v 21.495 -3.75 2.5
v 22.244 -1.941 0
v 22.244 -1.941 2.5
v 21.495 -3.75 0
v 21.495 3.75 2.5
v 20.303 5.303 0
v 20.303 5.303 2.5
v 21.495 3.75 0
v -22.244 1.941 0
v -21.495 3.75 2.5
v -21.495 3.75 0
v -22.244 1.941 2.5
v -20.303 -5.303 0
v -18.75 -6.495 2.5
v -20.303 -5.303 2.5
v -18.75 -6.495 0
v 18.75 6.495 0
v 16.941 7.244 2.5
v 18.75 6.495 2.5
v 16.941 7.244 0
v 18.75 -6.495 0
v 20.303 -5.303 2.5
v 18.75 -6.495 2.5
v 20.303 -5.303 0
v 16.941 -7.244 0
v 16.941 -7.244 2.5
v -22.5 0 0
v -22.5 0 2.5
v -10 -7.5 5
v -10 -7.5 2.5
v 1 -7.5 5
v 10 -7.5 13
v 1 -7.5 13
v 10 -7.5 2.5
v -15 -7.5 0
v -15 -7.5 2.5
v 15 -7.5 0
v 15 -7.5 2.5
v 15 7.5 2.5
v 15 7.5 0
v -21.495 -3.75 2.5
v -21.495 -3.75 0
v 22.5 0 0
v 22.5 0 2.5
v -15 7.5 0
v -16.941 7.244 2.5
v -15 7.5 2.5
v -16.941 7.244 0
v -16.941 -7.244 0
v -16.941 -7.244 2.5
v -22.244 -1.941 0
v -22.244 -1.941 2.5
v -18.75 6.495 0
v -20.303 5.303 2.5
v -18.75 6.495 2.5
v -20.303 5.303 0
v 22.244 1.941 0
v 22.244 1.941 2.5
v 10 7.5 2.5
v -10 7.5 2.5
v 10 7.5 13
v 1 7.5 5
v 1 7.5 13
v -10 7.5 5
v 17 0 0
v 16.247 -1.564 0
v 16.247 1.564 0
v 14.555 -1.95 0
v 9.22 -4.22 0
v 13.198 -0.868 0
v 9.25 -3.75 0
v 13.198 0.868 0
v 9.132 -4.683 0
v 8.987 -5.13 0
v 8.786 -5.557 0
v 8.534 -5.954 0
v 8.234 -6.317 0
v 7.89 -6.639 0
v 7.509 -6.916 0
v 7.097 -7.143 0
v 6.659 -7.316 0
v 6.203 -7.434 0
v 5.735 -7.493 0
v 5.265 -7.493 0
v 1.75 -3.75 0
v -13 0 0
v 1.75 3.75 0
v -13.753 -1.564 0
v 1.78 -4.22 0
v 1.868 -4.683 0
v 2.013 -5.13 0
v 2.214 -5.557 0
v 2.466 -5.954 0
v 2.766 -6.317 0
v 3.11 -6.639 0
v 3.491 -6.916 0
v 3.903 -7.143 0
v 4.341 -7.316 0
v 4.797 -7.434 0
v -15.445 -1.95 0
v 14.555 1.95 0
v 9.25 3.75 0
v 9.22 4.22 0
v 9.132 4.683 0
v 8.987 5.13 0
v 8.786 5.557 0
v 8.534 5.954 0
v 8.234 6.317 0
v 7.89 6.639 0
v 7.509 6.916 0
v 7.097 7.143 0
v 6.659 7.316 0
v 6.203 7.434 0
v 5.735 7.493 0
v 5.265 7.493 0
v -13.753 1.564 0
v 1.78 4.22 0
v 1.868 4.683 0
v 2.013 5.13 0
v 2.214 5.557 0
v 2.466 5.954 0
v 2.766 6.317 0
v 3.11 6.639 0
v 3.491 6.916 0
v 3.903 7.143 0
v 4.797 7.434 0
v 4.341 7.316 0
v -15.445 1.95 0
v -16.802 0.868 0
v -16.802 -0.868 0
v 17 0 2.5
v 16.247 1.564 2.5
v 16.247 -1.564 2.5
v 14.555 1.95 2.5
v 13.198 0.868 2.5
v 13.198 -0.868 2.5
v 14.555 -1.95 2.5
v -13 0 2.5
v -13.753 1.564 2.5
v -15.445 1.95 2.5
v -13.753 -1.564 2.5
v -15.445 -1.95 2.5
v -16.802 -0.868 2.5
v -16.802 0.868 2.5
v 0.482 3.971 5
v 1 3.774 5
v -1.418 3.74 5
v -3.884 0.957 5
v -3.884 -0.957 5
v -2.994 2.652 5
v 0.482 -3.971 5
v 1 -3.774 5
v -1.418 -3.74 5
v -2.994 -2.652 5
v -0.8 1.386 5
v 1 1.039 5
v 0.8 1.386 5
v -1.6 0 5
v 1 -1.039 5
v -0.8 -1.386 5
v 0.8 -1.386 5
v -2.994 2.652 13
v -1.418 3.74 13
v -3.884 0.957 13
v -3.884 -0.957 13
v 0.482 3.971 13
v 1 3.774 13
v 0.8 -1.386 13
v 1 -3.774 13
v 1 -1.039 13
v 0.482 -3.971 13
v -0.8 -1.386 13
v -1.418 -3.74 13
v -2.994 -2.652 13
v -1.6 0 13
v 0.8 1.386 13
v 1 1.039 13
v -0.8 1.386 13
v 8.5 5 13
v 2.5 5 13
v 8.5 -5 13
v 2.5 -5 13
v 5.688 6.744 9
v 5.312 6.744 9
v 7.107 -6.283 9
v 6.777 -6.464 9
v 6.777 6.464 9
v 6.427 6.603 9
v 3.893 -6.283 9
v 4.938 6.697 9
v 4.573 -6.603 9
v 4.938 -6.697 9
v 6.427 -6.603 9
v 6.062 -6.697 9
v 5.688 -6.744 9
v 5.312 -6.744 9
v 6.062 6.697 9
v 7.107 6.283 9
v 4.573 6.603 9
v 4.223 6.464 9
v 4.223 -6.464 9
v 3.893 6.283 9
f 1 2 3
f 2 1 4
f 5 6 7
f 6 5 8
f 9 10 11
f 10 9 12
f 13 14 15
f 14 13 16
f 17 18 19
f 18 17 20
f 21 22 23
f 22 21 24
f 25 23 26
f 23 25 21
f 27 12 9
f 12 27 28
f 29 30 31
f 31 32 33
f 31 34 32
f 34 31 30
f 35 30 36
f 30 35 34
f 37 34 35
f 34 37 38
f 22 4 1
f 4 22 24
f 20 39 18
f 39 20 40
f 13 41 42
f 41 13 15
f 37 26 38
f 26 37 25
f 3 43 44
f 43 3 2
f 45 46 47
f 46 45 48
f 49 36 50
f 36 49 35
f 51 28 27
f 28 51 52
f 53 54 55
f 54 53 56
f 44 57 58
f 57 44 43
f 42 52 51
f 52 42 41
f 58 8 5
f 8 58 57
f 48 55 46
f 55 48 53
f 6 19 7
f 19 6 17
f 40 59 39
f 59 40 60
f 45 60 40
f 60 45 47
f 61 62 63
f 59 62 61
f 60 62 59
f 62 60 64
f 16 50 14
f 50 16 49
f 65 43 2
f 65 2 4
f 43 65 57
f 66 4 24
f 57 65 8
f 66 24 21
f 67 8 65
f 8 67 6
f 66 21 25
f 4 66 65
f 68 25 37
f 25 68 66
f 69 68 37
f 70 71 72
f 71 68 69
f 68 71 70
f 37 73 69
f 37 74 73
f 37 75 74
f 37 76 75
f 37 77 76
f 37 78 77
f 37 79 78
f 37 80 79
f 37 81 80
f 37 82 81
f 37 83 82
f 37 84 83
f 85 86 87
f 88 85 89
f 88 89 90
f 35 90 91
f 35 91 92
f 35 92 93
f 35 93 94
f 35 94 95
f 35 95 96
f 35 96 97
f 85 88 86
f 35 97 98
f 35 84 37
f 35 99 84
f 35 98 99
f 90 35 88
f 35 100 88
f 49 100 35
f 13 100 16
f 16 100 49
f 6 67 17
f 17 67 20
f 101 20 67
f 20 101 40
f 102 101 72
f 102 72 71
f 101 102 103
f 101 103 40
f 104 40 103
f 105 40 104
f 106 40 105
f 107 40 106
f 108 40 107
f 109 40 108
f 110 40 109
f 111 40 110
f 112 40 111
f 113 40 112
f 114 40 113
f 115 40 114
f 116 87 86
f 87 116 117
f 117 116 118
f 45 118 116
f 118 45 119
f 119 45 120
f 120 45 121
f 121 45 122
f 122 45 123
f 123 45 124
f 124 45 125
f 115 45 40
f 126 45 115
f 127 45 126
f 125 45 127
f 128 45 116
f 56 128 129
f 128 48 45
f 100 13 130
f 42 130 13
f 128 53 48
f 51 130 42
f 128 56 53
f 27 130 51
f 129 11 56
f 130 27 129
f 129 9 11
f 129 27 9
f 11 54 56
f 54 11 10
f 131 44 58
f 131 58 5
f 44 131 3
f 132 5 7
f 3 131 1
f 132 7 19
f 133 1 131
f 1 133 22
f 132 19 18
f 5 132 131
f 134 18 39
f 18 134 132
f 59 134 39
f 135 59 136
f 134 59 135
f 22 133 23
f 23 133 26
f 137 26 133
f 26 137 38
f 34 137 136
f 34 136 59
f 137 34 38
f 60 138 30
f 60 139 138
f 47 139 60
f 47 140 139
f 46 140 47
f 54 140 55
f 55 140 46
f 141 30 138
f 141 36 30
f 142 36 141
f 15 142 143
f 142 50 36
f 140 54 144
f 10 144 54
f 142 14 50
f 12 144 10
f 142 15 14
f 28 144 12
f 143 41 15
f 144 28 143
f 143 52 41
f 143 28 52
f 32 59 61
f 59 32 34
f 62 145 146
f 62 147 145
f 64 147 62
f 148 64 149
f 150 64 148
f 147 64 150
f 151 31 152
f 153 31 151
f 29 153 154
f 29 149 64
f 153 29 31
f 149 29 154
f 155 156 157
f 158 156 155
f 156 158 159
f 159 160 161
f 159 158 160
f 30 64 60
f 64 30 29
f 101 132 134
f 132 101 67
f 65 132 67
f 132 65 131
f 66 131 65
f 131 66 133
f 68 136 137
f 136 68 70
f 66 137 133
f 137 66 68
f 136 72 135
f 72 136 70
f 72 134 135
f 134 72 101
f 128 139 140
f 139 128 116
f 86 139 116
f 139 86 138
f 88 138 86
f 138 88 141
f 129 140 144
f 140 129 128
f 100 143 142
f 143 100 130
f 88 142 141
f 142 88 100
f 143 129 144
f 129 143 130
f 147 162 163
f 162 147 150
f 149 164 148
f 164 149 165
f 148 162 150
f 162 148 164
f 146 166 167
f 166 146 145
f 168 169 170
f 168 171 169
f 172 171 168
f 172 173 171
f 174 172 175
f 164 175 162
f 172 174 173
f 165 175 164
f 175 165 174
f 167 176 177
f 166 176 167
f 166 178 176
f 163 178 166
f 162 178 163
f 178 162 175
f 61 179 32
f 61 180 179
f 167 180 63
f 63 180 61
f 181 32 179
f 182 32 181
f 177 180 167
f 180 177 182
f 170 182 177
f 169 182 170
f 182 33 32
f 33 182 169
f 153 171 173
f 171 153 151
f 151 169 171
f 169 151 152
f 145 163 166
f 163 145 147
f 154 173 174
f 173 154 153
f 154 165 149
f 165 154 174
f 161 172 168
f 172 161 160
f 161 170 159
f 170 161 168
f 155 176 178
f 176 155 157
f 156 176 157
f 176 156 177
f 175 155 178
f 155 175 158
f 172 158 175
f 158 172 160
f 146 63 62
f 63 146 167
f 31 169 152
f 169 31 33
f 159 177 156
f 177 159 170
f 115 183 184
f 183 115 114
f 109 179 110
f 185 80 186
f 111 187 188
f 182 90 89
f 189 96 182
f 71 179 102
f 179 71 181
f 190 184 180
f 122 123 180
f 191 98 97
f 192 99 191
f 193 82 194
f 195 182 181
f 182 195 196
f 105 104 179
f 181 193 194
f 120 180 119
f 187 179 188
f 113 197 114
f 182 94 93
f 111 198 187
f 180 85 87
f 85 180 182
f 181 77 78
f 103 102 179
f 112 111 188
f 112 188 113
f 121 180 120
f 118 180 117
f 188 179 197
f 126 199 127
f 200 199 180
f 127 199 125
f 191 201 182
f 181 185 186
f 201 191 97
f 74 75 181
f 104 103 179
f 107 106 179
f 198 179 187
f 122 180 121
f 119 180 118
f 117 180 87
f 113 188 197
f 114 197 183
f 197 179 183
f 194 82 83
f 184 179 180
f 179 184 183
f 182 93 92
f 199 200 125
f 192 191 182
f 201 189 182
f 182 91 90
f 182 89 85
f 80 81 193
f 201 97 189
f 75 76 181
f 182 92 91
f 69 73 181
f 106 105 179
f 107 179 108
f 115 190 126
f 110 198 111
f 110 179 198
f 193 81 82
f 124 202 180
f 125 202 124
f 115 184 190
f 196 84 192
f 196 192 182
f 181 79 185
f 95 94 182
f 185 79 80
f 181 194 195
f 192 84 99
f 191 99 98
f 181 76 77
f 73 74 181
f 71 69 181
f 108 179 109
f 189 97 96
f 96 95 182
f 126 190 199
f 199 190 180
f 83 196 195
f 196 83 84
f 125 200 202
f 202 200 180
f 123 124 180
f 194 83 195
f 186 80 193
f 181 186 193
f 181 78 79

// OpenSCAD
// file: fasteners.scad
/* fasteners                        */
/* include <fasteners.scad>          */

M3_grip_d   = 3.2;      // grips screw
M3_free_d   = 4;        // no grip
M3_countersunk_d = 6.5; // maximum diameter of countersunk hold for flathead M3

//countersink();

module countersink( d = M3_countersunk_d )
{
    r = d/2;
    translate ([0,0, -r]) cylinder(r1 = 0, r2 = r, h = r);
}
// file: arduino.scad
/* Arduino dimensions module                                         */
/* include <arduino.scad>                                   */
/* dimensions for arduino mounting holes                    */
/* modules to draw mounting holes                           */
/* and standoffs                                            */
/* Version 1.0: Created Simon Jensen-Fellows    01.31.2018  */

include <standoff.scad>
include <fasteners.scad>

/*  Arduino dimensions    uno | mega        */ 
/*  __________________________|_________    */
/*  |  O B                    |    E O |    */
/*  |         Y               |        |    */
/*  |         ^               |         \   */
/*  |         |           C O |          |   */
/*  |         |               |          |   */
/*  |         o-----> X       |          |   */
/*  |                     D O |          |   */
/*  |  O A                    |      F O |   */
/*  |_________________________|__________|   */
/*                            |              */

arduino_A_B_Y = 48.26;  // distance from A to B on the X axis
arduino_A_B_X = 1.27;   // distance from A to B on the Y axis
arduino_A_C_Y = 5.08 + 27.94;
arduino_A_C_X = 52.07;
arduino_A_D_Y = 5.08;
arduino_A_D_X = arduino_A_C_X;
arduino_A_E_Y = arduino_A_B_Y;
arduino_A_E_X = 76.2;
arduino_A_F_Y = 0;
arduino_A_F_X = 82.55; 

/* Note. On some uno/deicimilia boards,         */
/* the D hole is smaller than M3 - probably M2  */
/* This will be fixed later                     */

/* build standoffs for an original Uno type     */
/* Arduino board.                               */

module arduino_uno_standoffs( h = 10, inside_d = M3_grip_d, outside_d = 8)
{
    standoffs(inside_d = inside_d, outside_d = outside_d, h = h,
                v=[0, 0, arduino_A_B_X, arduino_A_B_Y, arduino_A_C_X, arduino_A_C_Y, arduino_A_D_X, arduino_A_D_Y]);
}    

/* build standoffs for a mega type Arduino board*/

module arduino_mega_standoffs( h = 10, inside_d = M3_grip_d, outside_d = 8)
{
       arduino_uno_standoffs(h=h, inside_d = inside_d, outside_d = outside_d);
       standoffs(inside_d = inside_d, outside_d = outside_d, h = h,
                v=[0, 0, arduino_A_E_X, arduino_A_E_Y, arduino_A_F_X, arduino_A_F_Y]);
}
// file: 37d.scad
/* 37D Motor module                                         */
/* include <37d.scad>                                       */
/* dimensions for 37D type motor                            */
/* modules to draw motor body and                           */
/* holes for mounting bolts and axle                        */
/* Version 1.0: Created Simon Jensen-Fellows    01.31.2018  */

include <simon.scad>
include <fasteners.scad>

37d_gearbox_d = 37;
37d_gearbox_l = 22;
37d_body_d = 34.5;
37d_full_l = 68;
37d_bolt_orbit_d = 31;  // diameter of the circle described by the M3 screw hols
37d_axle_d = 12.2;      // diameter of the axle bearing housing
37d_axle_offset = 7;    // distance from the center of the gearbox cylinder to the center of the axle bearing housing
37d_motor_base_w = 40;  // dimensions for the motor base mount housing
37d_motor_base_h = 20;
37d_bracket_width = 4;  // width of the bracket that mates with the face of the motor
//$fn = 100;
//37d_motor_base();     // uncomment this to build the motor mount alone

/* Describes the motor as two cylinders                     */
/* the fatter cylinder is the gearbox, the other is the main*/
/* motor body.                                              */
/* cylinder is oriented face down, centered on the origin   */
/* with the body upright in positive space.                 */

module 37d_body()
{
    cylinder( d = 37d_gearbox_d, h = 37d_gearbox_l);
    cylinder( d = 37d_body_d, h = 37d_full_l);
}

/* Describes the holes (cutouts) needed to mount the motor  */
/* to a bracket with the M3 screw holes.                    */
/* Use the same translate() arguments used for the body     */
/* and difference() with the bracket to remove the screw    */
/* cylinders.                                               */

module 37d_cutout(d = 3.2, h = 5)
{
    // axle surround
    translate([37d_axle_offset,0,-h]) cylinder( d= 37d_axle_d, h=h);
    // mounting bolt holes
    for(i = [0:60:300])
        rotate([0,0,i]) translate([0,37d_bolt_orbit_d/2,-h]){
            cylinder(d = d, h = h);
            rotate([180,0,0]) countersink();
        }
}    

/* Build a 37D motor mount                                  */
/* d is the diameter of the screw holes for the tension     */
/* strap. Ideally should be larger than the screw/bolt size.*/

module 37d_motor_base(d = 3.2)   
{  
                {
                    difference(){
                        union(){
                            cube([37d_bracket_width, 37d_motor_base_w, 37d_motor_base_w]);
                            cube([37d_full_l + 37d_bracket_width, 37d_motor_base_w , 37d_motor_base_h]);
                            translate([27,37d_motor_base_w/2, 37d_motor_base_w/2]) rotate([0,90,0]) cylinder(h=20, r= 37d_motor_base_w/2);
                            translate([37,37d_motor_base_w/2, 37d_motor_base_w]) rotate([90,90,0]) cylinder(h=10, r= 10, center = true);
                        }
                        translate([37d_bracket_width,37d_motor_base_w/2, 20]) rotate([0,90,0]) 37d_body();
                        translate([37d_bracket_width,37d_motor_base_w/2, 20]) rotate([0,90,0]) 37d_cutout(d = d, h = 37d_bracket_width);
                        translate([37,  37d_motor_base_w/2,37d_motor_base_w]) cube([21,2,20], center = true);
                        translate([37,37d_motor_base_w/2, 37d_motor_base_w + 3]) rotate([90,90,0]) cylinder(h=10, d = 3.2, center = true);
                    }
                }
}
// file: standoff.scad
/* Standoff                                                 */
/* include <standoff.scad>                                  */
/*                                                          */
/* Version 1.0: Created Simon Jensen-Fellows    01.31.2018  */

include <fasteners.scad>

module standoff(h = 10, inside_d = M3_grip_d, outside_d = 8)
        {
            difference()
            {
                    cylinder(h=h, d=outside_d);
                    cylinder(h=h, d=inside_d);
            }
        }
        
module standoffs(h = 10, inside_d = M3_grip_d, outside_d = 8, v=[0,0])
        {
            for(i=[1:2:len(v)]){
                translate([v[i-1],v[i],0])  standoff(h = h, inside_d = inside_d, outside_d = outside_d);
            }
        }
// file: simon.scad
contact_tolerance = 0.15;   // distance to allow parts to fit together.


module pie_slice(d=3.0,a=30, h= 3.85) {
  intersection() {
    cylinder(d=d, h = h);
    cube([d/2,d/2,h]);
    rotate(90-a)     cube([d/2,d/2,h]);
  }
}

module tube(h = 10, r= 10, wall = 1)
{
    difference()
    {
        cylinder(h=h, r=r);
        cylinder(h=h, r=r - wall);
    }
}

module semicircle(r = 10, h = 1)
{
       intersection()
        {
               cylinder(r = r, h = h);
               translate([0,-r,0]) cube([2*r,2*r,h]);
        }
 }
// main file
/* Main sparky robot design file                            */
/*                                                          */
/* Version 1.0: Created Simon Jensen-Fellows    01.31.2018  */
/* Version 1.1: Modified Simon Jensen-Fellows   02.05.2018  */
/*              improved configurability of ir cutouts      */

include <simon.scad>
include <standoff.scad>
include <37d.scad>
include <arduino.scad> 

base_height = 100;
base_radius = 145;
base_wall = 5;

slop = 5;

wheel_pitch = (base_radius * 2) - 70;//67;
motor_to_wheel_center = 25;
wheel_width = 40;
wheel_length = 90;
wheel_inset = 55;
strength_height = 15;

standoff_pitch = 80;
standoff_h = strength_height;
standoff_r = 4;
standoff_hole_d = M3_grip_d;
outside_standoff = 110;
standoff_y_origin = 25;
standoff_x_origin = 6;

cutout_height = base_height - strength_height;
cutout_width = 180;
cutout_depth = 100;

caster_holes = 39;


upboard_Y = 49;
upboard_X = 58;

rasbpi_Y = 49;
rasbpi_X = 58;

/* uncomment one of these */

//standalone_cutout();
//chassis_with_cutout();
//standalone_cutout();
//main_chassis();
//basic_lid();
//arduino_uno_standoffs();
//arduino_mega_standoffs();
//main_chassis(walls = true);
//expansion_frame();
//motor_bracket();
//base_cutout();

//base_insert();
IR_01_insert();

module  main_chassis_with_uno()
{
        main_chassis();
        translate([6+ (standoff_pitch - arduino_A_D_X),  -(110 + arduino_A_D_Y), base_wall]) arduino_uno_standoffs(h=standoff_h);

}
module chassis_with_cutout()
{
    difference(){
        main_chassis();    
        front_cutout();
    }   
}


module standalone_cutout()
{
     intersection(){
         main_chassis();    
        front_cutout();
    }   
}


        
module lid_support()
       {
            difference()
           {
            intersection()
            {
                
               translate([base_radius - base_wall,0,base_height])     sphere( r=10, center = true, $fn = 8);
               cylinder(h=base_height, r=base_radius);
            }
            translate([base_radius - base_wall -2,0,base_height])     cylinder( h=6, r=2);
            
        }
    }
    
    module lid_screwhole()
    {
        translate([base_radius - base_wall -2,0,base_height])     cylinder( h=6, r=2);            
    }
    
    
 module front_cutout()
    {
           translate([0,-(cutout_depth/2 + outside_standoff - standoff_r),(cutout_height/2) + strength_height]) cube([cutout_width,cutout_depth,cutout_height], center = true);
    }
    
module base_only(){
    cylinder(h = base_wall, r = base_radius -base_wall);
}


   
 module main_chassis(walls = true)
    {
        difference(){
            union(){
                difference(){                       // Main body and base
                    if(walls == true)    
                        outer_body();
                    else    
                        base_only();
                    translate([-caster_holes/2,100,0]) cylinder(h=6, d=3.2);                                          // holes for caster bolts
                    translate([caster_holes/2,100,0]) cylinder(h=6, d=3.2);                                           // 
                    
                    translate([-caster_holes/2,-100,0]) cylinder(h=6, d=3.2);                                          
                    translate([caster_holes/2,-100,0]) cylinder(h=6, d=3.2);                          
                }    
        
                // strengthening beams
                
                translate([0,0,base_wall+strength_height/2]) cube([base_wall,base_radius * 2 - 2,  strength_height], center = true);
               // translate([94,0,base_wall+strength_height/2]) cube([base_wall,base_radius * 2 - 70,  strength_height], center = true);
               // translate([-94,0,base_wall+strength_height/2]) cube([base_wall,base_radius * 2 - 70,  strength_height], center = true);
                translate([0,75,base_wall+strength_height/2]) cube([base_radius * 2 - 45, base_wall, strength_height], center = true);
                translate([0,-75,base_wall+strength_height/2]) cube([base_radius * 2 - 45, base_wall, strength_height], center = true);
                
                // D37 motor base
                translate([-(wheel_pitch - wheel_width)/2,-37d_motor_base_w/2,base_wall])   37d_motor_base();
                translate([(wheel_pitch - wheel_width)/2,-37d_motor_base_w/2,base_wall])   mirror() 37d_motor_base();
                
                    
            }
            translate([wheel_pitch/2, 0, wheel_width/2 - 1]) cube([wheel_width,wheel_length,wheel_width], center = true);
            translate([-wheel_pitch/2, 0, wheel_width/2 - 1]) cube([wheel_width,wheel_length,wheel_width], center = true);
            if(walls == false){
                tube(h = base_height, r = base_radius, wall = base_wall);
                base_holes();
            }
            
        ir_cutouts( inset = 20, a = 90);        
    }
    
    base_standoffs();
    if(walls == true) lid_supports();
    
} // end of main_chassis()

module  outer_body(){
    difference(){
    cylinder(h=base_height, r=base_radius);                                             // outer circular wall and base
    translate([0,0,base_wall]) cylinder(h = base_height, r = base_radius -base_wall);   // subtract inside volume
    }
}

module lid_supports(){
    lid_support();

    rotate(a=180, v=[0,0,1]) lid_support();
    rotate(a=90, v=[0,0,1]) lid_support();
    rotate(a=-90, v=[0,0,1]) lid_support();
}


module base_standoffs(){
    //translate([(wheel_pitch/2) - 20, 0, -25]) cube([1,1,44]);
    {
        x_off = standoff_x_origin + standoff_pitch;
        y_off = standoff_y_origin + standoff_pitch;
        
        translate ([0,0,base_wall])
            standoffs( h=standoff_h, v=[x_off,y_off,standoff_x_origin,y_off,x_off,standoff_y_origin,standoff_x_origin,standoff_y_origin]);
        translate ([0,0,base_wall])
            standoffs( h=standoff_h , v=[x_off,-y_off,standoff_x_origin,-y_off,x_off,-standoff_y_origin,standoff_x_origin,-standoff_y_origin]);    translate ([0,0,base_wall])
            standoffs( h=standoff_h , v=[-x_off,-y_off,-standoff_x_origin,-y_off,-x_off,-standoff_y_origin,-standoff_x_origin,-standoff_y_origin]);      
        translate ([0,0,base_wall])
            standoffs( h=standoff_h , v=[-x_off,y_off,-standoff_x_origin,y_off,-x_off,standoff_y_origin,-standoff_x_origin,standoff_y_origin]);   
    }
}
    
module basic_lid()
{
       difference(){ 
           translate([0,0,base_height]) cylinder(r=base_radius, h= base_wall);
            lid_screwhole();
        rotate(a=180, v=[0,0,1]) lid_screwhole();
        rotate(a=90, v=[0,0,1]) lid_screwhole();
        rotate(a=-90, v=[0,0,1]) lid_screwhole();
       }
       
       translate([0,0,base_height - strength_height/2])
       {
           rotate(a=45, v=[0,0,1]) cube([base_wall,(base_radius - base_wall) * 2,  strength_height], center = true);
           rotate(a=135, v=[0,0,1]) cube([base_wall,(base_radius - base_wall) * 2,  strength_height], center = true);
       }
}




module expansion_frame()
{
        expansion_arm();
        rotate(a=90, v=[0,0,1]) expansion_arm();
        translate([0,standoff_pitch,0,]) expansion_arm();
        translate([0,standoff_pitch/2,0,]) expansion_arm();
        translate([standoff_pitch,0,0]) rotate(a=90, v=[0,0,1]) expansion_arm();    
        translate([standoff_pitch/2,0,0]) rotate(a=90, v=[0,0,1]) expansion_arm();    
}

module expansion_arm()
{
        difference(){
            hull(){
                cylinder(r = standoff_r, h = base_wall);
                translate([standoff_pitch,0,0]) cylinder(r = standoff_r, h = base_wall);
            }
            cylinder(d = M3_free_d, h = base_wall);
            translate([standoff_pitch,0,0]) cylinder(d = M3_free_d, h = base_wall);
        }
}

module base_holes()
{
    // mounting bolt holes
    for(i = [30:60:330])
        rotate([0,0,i]) translate([0,base_radius - base_wall-5,0]){
            cylinder(d = M3_free_d, h = 10);
            rotate([180,0,0]) countersink(d = M3_countersunk_d);
        }
}    

/*  i = inset                            */
/*  a = angle of orientation            */
/*  p = vector of angles (locations)    */

module ir_cutouts(w = 15, inset = 15, a = 0, p=[20,-20,200,160]){
for(i = [0:len(p)-1])
        rotate([0,0,p[i]]) translate([0,base_radius - base_wall-inset,0]){
            rotate( a = a) base_cutout();
        }
}

/*  w = width of insert                 */

module base_cutout(w = 15, h = base_wall){
        hull(){
            translate([15,0,h/4]) cylinder( d = w + contact_tolerance, h = h/2, center = true);
            translate([-15,0,h/4]) cylinder( d = w + contact_tolerance, h = h/2, center = true);
        }
        translate([0,0,h/2]) cube([20 + contact_tolerance,w + contact_tolerance,h], center = true);
        translate([15,0,h/2]) cylinder( d = M3_grip_d, h = h, center = true);
        translate([-15,0,h/2]) cylinder( d = M3_grip_d, h = h, center = true);
}

module base_insert(w = 15, h = base_wall){
    difference(){
        union(){
            hull(){
                translate([15,0,h/4]) cylinder( d = w, h = h/2, center = true);
                translate([-15,0,h/4]) cylinder( d = w, h = h/2, center = true);
            }    
            translate([0,0,h/2]) cube([20,w,h], center = true);
        }
        translate([15,0,h/4]) cylinder( d = M3_free_d, h = h/2, center = true);
        translate([-15,0,h/4]) cylinder( d = M3_free_d, h = h/2, center = true);
    }
}

/*  build an insert for the IR_01       */
/*  infrared proximity detector         */
/*  intent is to use this as a cliff    */
/*  detector.                           */


module  IR_01_insert(h = base_wall){
        difference(){
            union(){
                base_insert(w=15, h = h);
                translate([5.5,0,base_wall + 4]) cube([9,15,8], center = true, color = "blue");
                translate([0, 0, base_wall]) standoff( h = 8 );
            }
            hull(){
                translate([5.5,0,(8 + base_wall)/2]) cube([6,10,8 + base_wall], center = true);
                translate([5.5,(7.5/2),0]) cylinder(r1 = (7.5/2), r2 = 3, h = 9, $fn = 50);
                translate([5.5, -(7.5/2),0]) cylinder(r1 = (7.5/2), r2 = 3, h = 9, $fn = 50);
            }
        }
}
